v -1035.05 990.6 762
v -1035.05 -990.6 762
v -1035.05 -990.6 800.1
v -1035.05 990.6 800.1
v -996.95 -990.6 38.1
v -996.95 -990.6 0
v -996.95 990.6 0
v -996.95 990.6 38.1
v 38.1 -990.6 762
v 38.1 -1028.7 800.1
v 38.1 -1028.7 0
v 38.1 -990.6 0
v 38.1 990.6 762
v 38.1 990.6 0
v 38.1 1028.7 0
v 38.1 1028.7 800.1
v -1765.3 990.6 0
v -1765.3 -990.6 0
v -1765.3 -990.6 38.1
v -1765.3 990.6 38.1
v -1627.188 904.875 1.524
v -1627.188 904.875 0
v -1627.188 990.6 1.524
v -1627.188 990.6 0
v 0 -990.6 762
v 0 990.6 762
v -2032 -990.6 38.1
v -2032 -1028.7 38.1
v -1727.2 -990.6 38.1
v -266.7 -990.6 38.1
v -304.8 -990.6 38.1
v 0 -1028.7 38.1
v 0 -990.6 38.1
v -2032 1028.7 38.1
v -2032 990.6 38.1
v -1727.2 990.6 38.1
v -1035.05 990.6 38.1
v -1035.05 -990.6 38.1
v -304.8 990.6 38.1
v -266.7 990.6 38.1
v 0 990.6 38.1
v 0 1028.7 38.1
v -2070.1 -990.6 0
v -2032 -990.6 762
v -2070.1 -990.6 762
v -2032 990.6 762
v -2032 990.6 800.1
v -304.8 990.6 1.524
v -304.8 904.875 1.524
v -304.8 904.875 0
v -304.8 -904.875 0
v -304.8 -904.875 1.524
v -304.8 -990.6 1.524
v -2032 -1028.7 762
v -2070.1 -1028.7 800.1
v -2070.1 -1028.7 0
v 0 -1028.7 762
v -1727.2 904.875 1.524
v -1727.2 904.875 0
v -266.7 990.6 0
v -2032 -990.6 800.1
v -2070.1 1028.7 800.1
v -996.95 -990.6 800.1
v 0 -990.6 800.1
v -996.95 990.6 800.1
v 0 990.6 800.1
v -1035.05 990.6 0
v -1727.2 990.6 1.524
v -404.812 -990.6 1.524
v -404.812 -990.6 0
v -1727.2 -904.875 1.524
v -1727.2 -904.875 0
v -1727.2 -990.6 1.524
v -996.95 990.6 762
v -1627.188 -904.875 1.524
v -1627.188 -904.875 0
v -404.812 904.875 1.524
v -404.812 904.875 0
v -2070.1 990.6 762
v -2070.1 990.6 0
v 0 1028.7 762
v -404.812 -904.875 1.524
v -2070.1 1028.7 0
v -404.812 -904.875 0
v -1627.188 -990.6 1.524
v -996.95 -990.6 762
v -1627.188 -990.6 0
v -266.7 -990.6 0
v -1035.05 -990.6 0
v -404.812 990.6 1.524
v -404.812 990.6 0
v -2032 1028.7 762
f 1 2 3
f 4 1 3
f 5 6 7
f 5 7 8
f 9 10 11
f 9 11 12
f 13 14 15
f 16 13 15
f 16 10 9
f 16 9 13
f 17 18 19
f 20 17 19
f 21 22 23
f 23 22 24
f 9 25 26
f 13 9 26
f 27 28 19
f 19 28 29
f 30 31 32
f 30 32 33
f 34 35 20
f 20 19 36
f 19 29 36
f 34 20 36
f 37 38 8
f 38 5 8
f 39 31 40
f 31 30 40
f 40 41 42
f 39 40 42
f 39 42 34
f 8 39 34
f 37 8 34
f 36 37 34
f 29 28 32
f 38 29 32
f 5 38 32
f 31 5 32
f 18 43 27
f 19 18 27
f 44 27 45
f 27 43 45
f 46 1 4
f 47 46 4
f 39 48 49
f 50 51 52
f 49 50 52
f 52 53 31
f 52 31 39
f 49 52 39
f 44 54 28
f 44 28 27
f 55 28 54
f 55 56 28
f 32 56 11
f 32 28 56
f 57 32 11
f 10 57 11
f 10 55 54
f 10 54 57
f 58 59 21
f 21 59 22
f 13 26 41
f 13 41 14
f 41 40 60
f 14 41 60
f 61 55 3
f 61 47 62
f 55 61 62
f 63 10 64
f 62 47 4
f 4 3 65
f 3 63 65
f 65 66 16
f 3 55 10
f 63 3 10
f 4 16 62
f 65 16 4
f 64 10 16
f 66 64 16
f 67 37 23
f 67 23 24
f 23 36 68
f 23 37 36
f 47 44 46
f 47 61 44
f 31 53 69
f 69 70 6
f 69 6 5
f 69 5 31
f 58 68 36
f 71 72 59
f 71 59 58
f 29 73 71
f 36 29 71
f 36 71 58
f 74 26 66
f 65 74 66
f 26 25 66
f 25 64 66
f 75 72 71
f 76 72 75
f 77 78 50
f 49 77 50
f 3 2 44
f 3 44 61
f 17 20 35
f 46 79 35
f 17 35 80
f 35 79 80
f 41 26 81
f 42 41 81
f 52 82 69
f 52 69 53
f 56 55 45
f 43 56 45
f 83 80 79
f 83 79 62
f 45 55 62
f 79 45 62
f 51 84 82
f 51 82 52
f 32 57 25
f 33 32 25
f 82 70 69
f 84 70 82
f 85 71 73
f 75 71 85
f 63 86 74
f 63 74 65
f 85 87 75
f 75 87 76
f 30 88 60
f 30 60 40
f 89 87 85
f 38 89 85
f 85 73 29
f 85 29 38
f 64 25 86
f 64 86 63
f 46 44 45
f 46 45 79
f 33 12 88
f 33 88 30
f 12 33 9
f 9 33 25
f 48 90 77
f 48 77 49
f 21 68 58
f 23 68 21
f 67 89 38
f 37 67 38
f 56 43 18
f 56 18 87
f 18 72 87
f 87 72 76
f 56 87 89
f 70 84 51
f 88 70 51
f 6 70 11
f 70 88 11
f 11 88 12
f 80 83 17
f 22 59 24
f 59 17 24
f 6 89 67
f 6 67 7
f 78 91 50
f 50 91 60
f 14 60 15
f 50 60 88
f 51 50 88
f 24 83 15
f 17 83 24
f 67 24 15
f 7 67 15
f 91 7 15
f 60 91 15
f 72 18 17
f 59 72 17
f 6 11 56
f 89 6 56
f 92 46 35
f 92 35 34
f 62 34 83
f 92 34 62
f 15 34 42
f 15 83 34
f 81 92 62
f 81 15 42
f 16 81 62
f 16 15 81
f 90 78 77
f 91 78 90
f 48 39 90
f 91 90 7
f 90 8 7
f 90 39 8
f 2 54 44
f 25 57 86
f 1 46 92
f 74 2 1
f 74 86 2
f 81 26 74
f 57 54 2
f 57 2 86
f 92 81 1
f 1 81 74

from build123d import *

# Parameters (mm, degrees)
F1_DEPTH  = 38.1
F4_W      = 38.1
F4_H      = 38.1
F5_DEPTH  = 2032
F7_W      = 38.1
F7_H      = 38.1
F7_W_2    = 38.1000000005
F8_DEPTH  = 2019.3
F9_W      = 100.0125
F9_H      = 85.725
F10_DEPTH = 1.524


with BuildPart() as f1:
    # F0 (on Right) → F1 (new body)
    with BuildSketch(Plane.YZ):
        Polygon((990.6, 762), (990.6, 0), (1028.7, 0), (1028.7, 800.1), (0, 800.1), (-1028.7, 800.1), (-1028.7, 0), (-990.6, 0), (-990.6, 762), (0, 762), align=None)
    extrude(amount=F1_DEPTH)


with BuildPart() as f3_1:
    # F3: instance of F1
    add(f1.part.mirror(Plane.YZ.offset(-1016)))


with BuildPart() as f1_1:
    add(f1.part)

    add(f3_1.part)  # F5 merges F3_1
    # F4 (on Right) → F5 (join, through all)
    with BuildSketch(Plane.YZ):
        with Locations((1009.65, 781.05)):
            Rectangle(F4_W, F4_H)
        with Locations((-1009.65, 781.05)):
            Rectangle(F4_W, F4_H)
        with Locations((-1009.65, 19.05)):
            Rectangle(F4_W, F4_H)
        with Locations((1009.65, 19.05)):
            Rectangle(F4_W, F4_H)
    extrude(amount=-F5_DEPTH)

    # F7 (on offset) → F8 (join, through all)
    with BuildSketch(Plane.XZ.offset(1028.7)):
        with Locations((-285.75, 19.05)):
            Rectangle(F7_W, F7_H)
        with Locations((-1016.0000000002, 781.05)):
            Rectangle(F7_W_2, F7_H)
        with Locations((-1746.25, 19.05)):
            Rectangle(F7_W, F7_H)
        with Locations((-1016, 19.05)):
            Rectangle(F7_W, F7_H)
    extrude(amount=-F8_DEPTH)

    # F9 (on Top) → F10 (join)
    with BuildSketch(Plane.XY):
        with Locations((-1677.19375, -947.7375)):
            Rectangle(F9_W, F9_H)
        with Locations((-1677.19375, 947.7375)):
            Rectangle(F9_W, F9_H)
        with Locations((-354.80625, -947.7375)):
            Rectangle(F9_W, F9_H)
        with Locations((-354.80625, 947.7375)):
            Rectangle(F9_W, F9_H)
    extrude(amount=F10_DEPTH)


solid = f1_1.part
